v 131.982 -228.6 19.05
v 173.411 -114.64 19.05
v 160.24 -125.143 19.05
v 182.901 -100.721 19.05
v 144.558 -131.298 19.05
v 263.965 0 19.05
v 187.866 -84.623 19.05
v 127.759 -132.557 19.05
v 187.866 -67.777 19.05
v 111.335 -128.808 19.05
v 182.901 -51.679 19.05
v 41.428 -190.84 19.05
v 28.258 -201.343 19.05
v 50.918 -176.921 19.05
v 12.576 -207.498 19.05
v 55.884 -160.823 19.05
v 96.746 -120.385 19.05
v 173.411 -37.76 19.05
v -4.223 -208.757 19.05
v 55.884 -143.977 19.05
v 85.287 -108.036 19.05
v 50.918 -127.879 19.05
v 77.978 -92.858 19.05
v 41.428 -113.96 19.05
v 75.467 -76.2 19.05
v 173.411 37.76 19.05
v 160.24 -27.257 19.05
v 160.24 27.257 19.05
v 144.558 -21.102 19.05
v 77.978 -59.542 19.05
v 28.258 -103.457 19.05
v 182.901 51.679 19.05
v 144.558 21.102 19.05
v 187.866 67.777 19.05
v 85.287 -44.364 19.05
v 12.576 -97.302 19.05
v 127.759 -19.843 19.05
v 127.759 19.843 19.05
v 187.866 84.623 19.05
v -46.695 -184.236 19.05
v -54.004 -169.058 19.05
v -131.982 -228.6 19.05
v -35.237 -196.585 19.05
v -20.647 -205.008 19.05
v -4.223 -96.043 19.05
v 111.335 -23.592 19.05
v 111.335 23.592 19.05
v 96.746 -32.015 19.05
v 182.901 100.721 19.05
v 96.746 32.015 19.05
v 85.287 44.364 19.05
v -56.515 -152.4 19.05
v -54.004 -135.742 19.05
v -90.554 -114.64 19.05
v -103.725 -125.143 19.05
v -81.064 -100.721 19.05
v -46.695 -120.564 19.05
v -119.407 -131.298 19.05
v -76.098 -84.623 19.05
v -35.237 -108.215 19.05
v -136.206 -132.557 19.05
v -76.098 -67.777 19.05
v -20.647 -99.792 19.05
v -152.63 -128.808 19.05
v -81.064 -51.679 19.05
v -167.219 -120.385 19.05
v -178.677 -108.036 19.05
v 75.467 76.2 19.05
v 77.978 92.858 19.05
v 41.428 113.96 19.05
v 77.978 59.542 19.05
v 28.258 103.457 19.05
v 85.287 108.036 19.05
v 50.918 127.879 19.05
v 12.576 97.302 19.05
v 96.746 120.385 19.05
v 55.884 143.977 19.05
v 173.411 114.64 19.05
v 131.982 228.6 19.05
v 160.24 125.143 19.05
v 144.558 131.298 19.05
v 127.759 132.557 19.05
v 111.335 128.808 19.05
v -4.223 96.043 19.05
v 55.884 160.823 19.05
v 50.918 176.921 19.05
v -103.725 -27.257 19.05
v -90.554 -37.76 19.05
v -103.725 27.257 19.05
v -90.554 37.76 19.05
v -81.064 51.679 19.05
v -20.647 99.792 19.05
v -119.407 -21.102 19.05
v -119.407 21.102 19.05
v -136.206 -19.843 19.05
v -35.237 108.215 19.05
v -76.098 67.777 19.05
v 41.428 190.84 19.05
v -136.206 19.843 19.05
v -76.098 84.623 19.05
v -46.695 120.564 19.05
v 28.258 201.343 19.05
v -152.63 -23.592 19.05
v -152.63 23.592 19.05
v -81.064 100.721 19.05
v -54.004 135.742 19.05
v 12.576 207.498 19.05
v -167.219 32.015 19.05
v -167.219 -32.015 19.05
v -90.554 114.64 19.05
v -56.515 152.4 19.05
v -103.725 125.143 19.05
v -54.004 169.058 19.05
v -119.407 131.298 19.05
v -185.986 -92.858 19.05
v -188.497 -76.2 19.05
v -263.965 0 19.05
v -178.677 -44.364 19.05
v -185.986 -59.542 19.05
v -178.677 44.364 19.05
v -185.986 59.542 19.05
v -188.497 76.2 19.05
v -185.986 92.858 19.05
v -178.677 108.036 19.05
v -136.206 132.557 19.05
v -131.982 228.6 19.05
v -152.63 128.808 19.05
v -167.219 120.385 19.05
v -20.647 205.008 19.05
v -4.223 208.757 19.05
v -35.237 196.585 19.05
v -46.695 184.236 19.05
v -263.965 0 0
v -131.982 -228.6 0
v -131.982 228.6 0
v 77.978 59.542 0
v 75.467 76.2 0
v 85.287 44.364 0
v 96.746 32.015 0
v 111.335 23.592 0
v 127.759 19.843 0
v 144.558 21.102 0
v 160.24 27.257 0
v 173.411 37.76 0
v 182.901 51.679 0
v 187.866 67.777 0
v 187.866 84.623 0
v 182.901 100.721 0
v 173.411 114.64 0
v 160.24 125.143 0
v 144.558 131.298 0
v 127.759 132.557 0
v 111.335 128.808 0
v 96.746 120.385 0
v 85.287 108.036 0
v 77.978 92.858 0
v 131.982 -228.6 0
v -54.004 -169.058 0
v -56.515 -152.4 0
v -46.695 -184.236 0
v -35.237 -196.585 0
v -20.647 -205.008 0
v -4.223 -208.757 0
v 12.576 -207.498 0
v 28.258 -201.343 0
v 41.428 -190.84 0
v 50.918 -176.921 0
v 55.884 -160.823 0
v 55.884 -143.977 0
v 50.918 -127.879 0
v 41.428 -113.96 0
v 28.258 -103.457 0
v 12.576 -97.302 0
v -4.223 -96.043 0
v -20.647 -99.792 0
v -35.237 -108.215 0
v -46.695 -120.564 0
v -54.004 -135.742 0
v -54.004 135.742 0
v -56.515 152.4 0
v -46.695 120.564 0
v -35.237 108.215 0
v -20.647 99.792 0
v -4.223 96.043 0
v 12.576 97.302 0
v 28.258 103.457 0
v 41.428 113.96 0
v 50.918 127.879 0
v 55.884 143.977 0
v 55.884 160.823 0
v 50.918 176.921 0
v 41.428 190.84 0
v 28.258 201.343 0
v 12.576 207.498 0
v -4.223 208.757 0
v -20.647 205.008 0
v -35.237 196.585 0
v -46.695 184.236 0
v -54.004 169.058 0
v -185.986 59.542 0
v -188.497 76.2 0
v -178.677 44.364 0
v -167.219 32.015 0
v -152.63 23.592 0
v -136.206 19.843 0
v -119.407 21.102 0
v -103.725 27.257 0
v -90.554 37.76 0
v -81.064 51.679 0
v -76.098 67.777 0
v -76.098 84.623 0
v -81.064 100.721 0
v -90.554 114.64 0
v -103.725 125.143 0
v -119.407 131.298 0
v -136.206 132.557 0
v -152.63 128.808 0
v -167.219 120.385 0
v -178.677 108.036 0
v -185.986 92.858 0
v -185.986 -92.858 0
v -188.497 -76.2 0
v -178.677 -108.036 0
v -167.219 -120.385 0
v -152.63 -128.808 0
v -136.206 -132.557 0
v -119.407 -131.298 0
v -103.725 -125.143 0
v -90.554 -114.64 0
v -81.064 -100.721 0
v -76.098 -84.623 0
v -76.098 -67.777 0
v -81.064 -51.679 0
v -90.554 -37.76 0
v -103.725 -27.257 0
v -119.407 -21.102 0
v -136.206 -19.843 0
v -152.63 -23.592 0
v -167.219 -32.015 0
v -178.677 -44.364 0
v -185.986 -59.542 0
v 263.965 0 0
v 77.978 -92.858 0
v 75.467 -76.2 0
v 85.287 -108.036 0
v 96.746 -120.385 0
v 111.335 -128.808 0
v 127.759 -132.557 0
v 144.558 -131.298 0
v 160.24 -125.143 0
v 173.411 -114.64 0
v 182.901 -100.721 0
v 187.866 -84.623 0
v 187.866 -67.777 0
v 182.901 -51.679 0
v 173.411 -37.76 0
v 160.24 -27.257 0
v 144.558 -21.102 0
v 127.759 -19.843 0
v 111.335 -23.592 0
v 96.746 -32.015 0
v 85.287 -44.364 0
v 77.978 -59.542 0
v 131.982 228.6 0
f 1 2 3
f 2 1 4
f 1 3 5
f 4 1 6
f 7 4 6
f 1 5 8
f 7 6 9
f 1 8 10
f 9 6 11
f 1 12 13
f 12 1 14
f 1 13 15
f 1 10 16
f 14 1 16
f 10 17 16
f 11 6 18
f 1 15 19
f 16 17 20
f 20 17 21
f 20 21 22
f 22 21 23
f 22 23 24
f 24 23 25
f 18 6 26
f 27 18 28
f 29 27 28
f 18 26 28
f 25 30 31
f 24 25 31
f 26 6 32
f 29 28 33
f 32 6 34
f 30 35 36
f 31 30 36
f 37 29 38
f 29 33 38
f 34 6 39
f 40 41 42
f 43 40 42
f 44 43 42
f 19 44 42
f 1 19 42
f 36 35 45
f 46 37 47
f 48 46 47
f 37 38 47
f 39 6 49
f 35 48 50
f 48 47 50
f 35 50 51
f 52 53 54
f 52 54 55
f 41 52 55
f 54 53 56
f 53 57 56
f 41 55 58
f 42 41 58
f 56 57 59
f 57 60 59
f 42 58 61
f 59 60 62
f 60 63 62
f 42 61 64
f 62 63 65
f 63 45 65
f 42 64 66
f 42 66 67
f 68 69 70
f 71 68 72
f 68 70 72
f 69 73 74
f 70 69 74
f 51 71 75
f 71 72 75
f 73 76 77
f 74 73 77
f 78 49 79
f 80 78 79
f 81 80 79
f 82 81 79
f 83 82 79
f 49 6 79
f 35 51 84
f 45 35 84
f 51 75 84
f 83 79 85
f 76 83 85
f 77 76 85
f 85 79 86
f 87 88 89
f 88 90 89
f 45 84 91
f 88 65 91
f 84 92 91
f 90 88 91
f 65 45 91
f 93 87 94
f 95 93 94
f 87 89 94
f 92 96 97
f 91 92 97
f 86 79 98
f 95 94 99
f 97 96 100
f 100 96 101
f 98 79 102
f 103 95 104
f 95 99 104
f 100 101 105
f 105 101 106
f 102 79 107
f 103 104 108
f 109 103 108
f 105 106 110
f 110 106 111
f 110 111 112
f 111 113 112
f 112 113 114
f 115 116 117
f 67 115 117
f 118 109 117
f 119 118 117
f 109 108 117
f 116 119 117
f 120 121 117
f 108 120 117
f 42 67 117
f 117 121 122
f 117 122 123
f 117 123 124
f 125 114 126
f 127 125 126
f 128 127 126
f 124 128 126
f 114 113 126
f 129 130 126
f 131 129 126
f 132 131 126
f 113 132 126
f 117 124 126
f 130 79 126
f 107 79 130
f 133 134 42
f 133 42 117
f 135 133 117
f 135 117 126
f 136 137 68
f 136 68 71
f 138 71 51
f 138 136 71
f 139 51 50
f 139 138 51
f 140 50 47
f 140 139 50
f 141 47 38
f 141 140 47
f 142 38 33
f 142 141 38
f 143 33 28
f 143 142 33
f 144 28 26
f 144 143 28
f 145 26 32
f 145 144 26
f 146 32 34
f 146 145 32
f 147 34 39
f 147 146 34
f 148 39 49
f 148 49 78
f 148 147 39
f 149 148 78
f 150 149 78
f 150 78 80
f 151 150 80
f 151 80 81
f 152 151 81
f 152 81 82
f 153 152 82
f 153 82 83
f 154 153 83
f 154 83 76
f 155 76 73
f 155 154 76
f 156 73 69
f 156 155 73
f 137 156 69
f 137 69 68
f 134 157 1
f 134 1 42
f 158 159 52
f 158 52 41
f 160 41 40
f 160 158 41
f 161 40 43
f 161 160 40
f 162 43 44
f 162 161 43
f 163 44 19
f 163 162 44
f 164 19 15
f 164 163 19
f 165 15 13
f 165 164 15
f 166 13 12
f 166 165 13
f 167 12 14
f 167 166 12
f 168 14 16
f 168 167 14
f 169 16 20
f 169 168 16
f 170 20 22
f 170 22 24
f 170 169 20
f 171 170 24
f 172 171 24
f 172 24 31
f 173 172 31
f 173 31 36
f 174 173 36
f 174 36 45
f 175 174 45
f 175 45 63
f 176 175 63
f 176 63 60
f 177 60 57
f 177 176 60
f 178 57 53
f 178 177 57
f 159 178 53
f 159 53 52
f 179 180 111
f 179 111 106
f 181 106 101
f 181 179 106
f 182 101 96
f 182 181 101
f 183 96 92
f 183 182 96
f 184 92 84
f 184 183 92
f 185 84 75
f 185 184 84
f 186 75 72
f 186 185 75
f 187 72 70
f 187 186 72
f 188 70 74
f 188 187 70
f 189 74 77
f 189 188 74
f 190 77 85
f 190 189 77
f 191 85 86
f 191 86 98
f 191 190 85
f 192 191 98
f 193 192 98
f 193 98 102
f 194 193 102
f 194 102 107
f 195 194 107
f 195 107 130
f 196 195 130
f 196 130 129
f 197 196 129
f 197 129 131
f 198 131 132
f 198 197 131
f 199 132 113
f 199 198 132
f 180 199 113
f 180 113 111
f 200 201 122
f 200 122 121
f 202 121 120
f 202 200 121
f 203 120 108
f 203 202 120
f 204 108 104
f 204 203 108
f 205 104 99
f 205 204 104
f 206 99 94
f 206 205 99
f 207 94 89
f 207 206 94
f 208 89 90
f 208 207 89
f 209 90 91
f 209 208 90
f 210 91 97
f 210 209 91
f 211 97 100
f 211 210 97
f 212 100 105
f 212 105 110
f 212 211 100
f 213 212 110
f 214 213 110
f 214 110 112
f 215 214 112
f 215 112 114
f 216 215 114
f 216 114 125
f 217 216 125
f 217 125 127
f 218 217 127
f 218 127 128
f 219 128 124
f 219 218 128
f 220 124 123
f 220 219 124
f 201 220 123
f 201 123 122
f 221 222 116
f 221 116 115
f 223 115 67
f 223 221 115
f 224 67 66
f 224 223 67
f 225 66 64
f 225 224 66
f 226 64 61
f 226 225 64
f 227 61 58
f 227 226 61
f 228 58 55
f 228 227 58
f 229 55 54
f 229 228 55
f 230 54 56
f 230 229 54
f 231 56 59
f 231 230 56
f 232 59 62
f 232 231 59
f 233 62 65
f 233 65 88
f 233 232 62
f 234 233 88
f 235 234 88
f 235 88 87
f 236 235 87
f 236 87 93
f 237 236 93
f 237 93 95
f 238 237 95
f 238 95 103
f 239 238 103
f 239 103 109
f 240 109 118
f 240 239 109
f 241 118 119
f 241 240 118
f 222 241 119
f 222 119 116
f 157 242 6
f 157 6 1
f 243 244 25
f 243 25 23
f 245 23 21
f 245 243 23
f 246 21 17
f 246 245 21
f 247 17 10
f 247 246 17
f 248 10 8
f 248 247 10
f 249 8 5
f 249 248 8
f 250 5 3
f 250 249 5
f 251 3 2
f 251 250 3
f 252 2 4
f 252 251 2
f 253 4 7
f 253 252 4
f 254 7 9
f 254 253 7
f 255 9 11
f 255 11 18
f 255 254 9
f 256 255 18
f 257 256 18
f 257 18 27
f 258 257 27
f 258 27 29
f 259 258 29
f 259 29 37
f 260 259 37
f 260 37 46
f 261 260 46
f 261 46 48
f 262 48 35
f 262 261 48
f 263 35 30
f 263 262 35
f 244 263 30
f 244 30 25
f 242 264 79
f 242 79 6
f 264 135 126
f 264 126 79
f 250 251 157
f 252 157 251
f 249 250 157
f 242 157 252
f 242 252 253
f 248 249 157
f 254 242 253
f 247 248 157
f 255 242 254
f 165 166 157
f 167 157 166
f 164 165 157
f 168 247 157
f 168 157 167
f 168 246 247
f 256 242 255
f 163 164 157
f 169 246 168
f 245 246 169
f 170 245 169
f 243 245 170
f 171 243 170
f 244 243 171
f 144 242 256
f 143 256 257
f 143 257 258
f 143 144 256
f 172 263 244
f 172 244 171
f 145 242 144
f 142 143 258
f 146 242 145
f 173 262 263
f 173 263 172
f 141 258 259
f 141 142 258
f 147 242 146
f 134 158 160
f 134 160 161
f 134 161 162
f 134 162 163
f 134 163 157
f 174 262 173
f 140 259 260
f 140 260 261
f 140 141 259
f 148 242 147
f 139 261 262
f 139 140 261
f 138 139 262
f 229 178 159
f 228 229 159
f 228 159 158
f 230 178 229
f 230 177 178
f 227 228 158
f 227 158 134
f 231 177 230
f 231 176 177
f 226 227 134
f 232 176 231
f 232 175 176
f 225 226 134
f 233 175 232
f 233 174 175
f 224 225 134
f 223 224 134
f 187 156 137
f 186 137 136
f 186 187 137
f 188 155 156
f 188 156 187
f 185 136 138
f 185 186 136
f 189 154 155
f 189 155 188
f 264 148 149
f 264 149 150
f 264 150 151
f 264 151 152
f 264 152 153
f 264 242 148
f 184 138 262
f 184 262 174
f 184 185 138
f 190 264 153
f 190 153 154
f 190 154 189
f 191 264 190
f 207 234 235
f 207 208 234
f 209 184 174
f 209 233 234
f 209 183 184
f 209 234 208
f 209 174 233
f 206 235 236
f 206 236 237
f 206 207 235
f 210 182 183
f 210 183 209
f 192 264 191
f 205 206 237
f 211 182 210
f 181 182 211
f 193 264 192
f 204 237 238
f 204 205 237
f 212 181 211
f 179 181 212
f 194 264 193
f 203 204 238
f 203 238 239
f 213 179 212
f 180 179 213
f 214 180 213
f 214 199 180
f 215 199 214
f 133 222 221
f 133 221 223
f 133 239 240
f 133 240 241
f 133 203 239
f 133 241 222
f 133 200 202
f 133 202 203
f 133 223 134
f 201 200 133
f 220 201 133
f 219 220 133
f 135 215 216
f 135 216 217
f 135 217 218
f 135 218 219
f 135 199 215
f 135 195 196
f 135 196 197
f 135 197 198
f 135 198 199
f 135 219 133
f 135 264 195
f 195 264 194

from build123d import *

# Parameters (mm, degrees)
SKETCH1_R           = 56.515
BOSS_EXTRUDE1_DEPTH = 19.05


with BuildPart() as part:
    # Sketch1 → Boss-Extrude1 (new body)
    # profile 1 of 6: a face of its own
    with BuildSketch(Plane.XY):
        Polygon((-263.964543073, 0), (-131.982271537, 228.6), (0, 0), align=None)
        with Locations(Location((-131.982271537, 76.2, 0), (0, 0, 180))):
            Circle(SKETCH1_R, mode=Mode.SUBTRACT)
    # profile 2 of 6: a face of its own
    with BuildSketch(Plane.XY):
        Polygon((131.982271537, 228.6), (0, 0), (-131.982271537, 228.6), align=None)
        with Locations(Location((0, 152.4, 0), (0, 0, 180))):
            Circle(SKETCH1_R, mode=Mode.SUBTRACT)
    # profile 3 of 6: a face of its own
    with BuildSketch(Plane.XY):
        Polygon((263.964543073, 0), (0, 0), (131.982271537, 228.6), align=None)
        with Locations(Location((131.982271537, 76.2, 0), (0, 0, 180))):
            Circle(SKETCH1_R, mode=Mode.SUBTRACT)
    # profile 4 of 6: a face of its own
    with BuildSketch(Plane.XY):
        Polygon((131.982271537, -228.6), (0, 0), (263.964543073, 0), align=None)
        with Locations(Location((131.982271537, -76.2, 0), (0, 0, 180))):
            Circle(SKETCH1_R, mode=Mode.SUBTRACT)
    # profile 5 of 6: a face of its own
    with BuildSketch(Plane.XY):
        Polygon((-131.982271537, -228.6), (0, 0), (131.982271537, -228.6), align=None)
        with Locations(Location((0, -152.4, 0), (0, 0, 180))):
            Circle(SKETCH1_R, mode=Mode.SUBTRACT)
    # profile 6 of 6: a face of its own
    with BuildSketch(Plane.XY):
        Polygon((-263.964543073, 0), (0, 0), (-131.982271537, -228.6), align=None)
        with Locations(Location((-131.982271537, -76.2, 0), (0, 0, 180))):
            Circle(SKETCH1_R, mode=Mode.SUBTRACT)
    extrude(amount=BOSS_EXTRUDE1_DEPTH)


solid = part.part
